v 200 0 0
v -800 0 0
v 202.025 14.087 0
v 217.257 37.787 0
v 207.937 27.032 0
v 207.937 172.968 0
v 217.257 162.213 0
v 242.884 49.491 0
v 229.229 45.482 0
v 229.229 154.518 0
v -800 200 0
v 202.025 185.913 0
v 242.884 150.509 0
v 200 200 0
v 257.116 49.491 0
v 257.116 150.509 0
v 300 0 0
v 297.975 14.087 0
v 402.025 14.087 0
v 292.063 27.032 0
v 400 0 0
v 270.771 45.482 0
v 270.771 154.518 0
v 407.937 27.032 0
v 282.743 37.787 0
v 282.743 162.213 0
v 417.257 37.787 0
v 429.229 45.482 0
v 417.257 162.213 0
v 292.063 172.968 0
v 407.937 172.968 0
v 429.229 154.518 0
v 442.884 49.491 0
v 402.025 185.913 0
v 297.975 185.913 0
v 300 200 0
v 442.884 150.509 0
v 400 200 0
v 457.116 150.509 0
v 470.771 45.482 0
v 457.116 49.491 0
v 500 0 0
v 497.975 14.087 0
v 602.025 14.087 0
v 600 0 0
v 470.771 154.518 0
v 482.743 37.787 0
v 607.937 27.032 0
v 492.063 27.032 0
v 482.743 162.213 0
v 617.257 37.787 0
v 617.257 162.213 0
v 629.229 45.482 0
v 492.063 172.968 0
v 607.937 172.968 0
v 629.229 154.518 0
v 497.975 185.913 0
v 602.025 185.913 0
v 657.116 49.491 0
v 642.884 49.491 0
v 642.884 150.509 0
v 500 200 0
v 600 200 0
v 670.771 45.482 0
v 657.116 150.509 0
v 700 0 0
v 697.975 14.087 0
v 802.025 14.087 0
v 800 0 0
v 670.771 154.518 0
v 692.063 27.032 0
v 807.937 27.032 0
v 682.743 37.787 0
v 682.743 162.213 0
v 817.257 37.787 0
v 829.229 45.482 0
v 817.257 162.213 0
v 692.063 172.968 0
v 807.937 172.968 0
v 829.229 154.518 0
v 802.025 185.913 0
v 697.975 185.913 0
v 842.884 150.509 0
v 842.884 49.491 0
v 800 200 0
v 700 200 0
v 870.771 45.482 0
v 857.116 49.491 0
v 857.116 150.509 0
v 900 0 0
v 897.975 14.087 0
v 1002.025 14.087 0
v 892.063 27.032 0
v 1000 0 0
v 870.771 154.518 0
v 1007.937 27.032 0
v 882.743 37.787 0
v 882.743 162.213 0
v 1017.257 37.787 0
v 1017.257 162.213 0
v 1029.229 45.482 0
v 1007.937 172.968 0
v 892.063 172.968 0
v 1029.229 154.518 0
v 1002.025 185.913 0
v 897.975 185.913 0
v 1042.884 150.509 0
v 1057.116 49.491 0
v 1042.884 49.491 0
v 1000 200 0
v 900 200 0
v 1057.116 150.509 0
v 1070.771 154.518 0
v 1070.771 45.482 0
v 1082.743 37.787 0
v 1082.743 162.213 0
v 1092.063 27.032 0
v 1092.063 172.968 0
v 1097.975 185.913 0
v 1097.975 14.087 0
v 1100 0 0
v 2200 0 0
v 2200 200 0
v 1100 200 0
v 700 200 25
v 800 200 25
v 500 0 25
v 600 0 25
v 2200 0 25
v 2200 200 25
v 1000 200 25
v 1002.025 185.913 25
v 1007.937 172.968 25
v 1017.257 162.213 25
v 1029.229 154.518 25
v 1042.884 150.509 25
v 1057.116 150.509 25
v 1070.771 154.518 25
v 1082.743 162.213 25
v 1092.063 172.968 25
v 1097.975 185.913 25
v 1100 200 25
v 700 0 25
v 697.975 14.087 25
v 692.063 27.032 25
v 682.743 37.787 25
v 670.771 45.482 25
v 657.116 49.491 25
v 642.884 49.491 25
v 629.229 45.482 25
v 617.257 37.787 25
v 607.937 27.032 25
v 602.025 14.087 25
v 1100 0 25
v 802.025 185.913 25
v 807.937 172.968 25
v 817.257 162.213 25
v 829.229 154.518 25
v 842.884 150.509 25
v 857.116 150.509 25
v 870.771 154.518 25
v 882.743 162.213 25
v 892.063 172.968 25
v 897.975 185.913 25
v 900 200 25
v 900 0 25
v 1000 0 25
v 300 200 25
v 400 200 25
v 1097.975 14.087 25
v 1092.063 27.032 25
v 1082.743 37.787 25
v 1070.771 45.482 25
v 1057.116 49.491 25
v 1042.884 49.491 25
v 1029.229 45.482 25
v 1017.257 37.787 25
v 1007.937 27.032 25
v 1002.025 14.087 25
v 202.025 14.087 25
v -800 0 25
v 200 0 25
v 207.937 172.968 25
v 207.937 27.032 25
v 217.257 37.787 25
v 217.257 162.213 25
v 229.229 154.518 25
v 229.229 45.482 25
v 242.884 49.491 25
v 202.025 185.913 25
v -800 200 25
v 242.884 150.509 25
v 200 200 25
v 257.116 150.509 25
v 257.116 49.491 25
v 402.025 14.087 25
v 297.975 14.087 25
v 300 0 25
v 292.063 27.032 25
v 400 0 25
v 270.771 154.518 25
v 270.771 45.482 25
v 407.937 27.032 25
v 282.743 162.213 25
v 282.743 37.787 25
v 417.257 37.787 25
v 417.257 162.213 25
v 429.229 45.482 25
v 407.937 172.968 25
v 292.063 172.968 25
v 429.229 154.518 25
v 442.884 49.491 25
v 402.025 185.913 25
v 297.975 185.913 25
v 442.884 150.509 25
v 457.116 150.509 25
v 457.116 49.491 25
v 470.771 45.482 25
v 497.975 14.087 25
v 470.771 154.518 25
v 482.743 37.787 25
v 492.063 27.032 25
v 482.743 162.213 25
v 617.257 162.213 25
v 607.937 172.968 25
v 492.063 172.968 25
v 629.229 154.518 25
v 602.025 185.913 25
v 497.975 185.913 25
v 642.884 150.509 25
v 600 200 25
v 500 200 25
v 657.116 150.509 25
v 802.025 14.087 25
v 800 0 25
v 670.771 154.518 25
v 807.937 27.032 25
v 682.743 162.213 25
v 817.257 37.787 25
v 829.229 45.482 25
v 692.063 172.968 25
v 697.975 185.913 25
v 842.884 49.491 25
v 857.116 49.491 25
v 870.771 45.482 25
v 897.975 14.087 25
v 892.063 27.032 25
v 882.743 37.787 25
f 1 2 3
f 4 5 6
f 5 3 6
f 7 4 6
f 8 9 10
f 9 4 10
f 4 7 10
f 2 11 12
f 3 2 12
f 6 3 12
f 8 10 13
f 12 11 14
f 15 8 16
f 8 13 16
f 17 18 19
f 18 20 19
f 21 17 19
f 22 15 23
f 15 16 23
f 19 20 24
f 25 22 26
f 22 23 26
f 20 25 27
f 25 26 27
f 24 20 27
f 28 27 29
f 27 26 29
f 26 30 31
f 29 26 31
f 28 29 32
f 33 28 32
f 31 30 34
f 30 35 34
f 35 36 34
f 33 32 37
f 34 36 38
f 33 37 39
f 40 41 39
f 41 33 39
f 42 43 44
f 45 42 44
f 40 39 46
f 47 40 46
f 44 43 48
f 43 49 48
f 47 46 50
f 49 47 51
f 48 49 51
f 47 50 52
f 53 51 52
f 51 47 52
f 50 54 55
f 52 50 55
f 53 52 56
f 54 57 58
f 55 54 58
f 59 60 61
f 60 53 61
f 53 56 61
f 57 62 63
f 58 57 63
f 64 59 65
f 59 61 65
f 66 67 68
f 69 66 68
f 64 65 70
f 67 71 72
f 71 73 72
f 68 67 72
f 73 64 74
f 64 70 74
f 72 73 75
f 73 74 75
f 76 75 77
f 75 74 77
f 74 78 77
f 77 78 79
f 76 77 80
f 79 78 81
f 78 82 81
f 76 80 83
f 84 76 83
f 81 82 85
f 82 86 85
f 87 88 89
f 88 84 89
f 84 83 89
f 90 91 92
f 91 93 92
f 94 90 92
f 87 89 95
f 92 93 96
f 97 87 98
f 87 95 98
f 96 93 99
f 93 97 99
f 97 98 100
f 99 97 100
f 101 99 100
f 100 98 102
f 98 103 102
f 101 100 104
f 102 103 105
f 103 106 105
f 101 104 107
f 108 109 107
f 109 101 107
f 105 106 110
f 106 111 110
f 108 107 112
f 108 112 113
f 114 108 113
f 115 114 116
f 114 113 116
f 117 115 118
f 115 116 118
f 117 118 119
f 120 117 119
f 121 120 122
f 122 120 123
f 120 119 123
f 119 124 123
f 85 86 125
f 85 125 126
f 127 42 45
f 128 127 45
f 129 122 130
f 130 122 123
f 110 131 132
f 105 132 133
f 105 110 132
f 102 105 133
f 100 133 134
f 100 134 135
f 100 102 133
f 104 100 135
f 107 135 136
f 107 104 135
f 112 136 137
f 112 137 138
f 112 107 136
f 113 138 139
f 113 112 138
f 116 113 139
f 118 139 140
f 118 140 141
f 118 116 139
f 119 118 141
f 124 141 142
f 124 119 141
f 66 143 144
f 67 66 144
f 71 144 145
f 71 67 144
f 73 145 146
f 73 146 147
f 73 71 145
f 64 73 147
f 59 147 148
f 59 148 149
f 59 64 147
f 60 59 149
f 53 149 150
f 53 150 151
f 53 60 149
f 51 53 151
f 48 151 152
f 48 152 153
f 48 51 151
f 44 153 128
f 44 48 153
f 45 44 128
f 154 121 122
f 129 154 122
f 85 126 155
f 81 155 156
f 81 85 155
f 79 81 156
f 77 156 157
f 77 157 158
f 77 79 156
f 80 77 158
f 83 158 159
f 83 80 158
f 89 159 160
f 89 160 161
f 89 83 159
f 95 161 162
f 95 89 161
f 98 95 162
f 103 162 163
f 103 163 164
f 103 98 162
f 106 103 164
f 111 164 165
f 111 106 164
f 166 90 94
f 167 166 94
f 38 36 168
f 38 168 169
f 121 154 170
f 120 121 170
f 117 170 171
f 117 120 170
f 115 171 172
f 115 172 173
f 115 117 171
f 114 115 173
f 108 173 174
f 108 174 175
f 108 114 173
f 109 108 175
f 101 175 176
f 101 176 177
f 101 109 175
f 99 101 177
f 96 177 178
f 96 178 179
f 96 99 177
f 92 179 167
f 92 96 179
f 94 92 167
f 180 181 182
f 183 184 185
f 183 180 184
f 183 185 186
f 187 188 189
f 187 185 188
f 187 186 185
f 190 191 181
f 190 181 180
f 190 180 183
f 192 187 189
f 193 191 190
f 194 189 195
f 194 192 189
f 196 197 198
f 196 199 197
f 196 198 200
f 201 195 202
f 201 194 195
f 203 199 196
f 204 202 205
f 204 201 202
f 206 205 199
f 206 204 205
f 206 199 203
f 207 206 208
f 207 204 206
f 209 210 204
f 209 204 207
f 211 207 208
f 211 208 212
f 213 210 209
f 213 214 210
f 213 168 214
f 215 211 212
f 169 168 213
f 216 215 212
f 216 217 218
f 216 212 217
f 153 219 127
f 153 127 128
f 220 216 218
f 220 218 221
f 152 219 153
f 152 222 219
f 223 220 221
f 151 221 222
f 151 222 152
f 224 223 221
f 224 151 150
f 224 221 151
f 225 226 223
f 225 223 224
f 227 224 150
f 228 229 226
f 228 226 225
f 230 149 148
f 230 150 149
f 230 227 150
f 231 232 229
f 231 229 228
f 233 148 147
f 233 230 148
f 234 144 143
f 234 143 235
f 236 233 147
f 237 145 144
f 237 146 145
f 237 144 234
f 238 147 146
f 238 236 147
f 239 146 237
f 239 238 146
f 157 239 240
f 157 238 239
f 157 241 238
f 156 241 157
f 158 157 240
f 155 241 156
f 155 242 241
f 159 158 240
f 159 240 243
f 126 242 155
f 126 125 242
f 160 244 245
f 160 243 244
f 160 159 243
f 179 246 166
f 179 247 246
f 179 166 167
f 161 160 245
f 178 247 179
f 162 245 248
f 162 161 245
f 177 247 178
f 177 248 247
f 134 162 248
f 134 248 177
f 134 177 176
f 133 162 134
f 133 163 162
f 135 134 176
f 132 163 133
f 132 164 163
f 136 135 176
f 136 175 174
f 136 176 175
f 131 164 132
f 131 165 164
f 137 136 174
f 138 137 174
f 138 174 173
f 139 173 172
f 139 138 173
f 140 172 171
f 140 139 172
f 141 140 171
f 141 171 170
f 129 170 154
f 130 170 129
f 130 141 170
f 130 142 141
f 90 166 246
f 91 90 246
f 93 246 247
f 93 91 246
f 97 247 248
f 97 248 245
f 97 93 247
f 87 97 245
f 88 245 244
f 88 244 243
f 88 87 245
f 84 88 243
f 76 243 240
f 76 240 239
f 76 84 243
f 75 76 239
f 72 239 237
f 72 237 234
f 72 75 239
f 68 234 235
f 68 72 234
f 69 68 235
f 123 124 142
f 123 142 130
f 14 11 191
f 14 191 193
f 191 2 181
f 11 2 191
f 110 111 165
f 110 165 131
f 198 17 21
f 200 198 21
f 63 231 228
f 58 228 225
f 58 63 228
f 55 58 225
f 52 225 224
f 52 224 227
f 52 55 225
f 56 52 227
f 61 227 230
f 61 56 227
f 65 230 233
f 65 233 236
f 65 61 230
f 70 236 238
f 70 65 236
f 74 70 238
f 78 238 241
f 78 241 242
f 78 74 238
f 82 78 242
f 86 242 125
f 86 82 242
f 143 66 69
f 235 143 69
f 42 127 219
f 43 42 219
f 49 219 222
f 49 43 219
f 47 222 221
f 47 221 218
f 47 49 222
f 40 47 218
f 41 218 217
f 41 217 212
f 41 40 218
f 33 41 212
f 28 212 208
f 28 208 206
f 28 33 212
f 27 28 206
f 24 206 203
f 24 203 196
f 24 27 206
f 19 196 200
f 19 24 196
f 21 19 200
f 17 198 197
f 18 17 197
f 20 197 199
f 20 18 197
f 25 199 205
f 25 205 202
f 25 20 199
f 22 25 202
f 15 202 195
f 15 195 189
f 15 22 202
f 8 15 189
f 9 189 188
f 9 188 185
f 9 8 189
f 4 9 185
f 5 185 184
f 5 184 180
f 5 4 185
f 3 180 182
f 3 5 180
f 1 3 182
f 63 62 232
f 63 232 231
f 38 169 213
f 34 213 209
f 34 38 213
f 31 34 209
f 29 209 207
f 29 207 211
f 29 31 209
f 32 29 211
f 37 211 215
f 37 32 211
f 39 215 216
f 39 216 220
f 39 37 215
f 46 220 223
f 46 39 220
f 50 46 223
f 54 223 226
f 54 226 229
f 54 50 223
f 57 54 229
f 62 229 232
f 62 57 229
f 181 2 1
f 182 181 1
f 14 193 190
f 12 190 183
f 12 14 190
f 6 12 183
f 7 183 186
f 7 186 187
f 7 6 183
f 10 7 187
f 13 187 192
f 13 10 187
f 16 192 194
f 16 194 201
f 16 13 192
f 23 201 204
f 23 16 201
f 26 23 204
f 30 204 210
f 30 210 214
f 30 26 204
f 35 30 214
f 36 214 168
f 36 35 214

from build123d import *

# Parameters (mm, degrees)
CYLINDER_R        = 50
CYLINDER_DEPTH    = 25
CYLINDER002_R     = 50
CYLINDER002_DEPTH = 25
CYLINDER001_R     = 50
CYLINDER001_DEPTH = 25
CYLINDER003_R     = 50
CYLINDER003_DEPTH = 25
CYLINDER004_R     = 50
CYLINDER004_DEPTH = 25
CYLINDER006_R     = 50
CYLINDER006_DEPTH = 25
CYLINDER005_R     = 50
CYLINDER005_DEPTH = 25
CYLINDER007_R     = 50
CYLINDER007_DEPTH = 25
CYLINDER008_R     = 50
CYLINDER008_DEPTH = 25
CYLINDER009_R     = 50
CYLINDER009_DEPTH = 25
BOX_W             = 3000
BOX_H             = 200
BOX_DEPTH         = 25


with BuildPart() as cylinder:
    # Cylinder → Cylinder (new body)
    with BuildSketch(Plane(origin=(250, 0, 0), x_dir=(1, 0, 0), z_dir=(0, 0, 1))):
        Circle(CYLINDER_R)
    extrude(amount=CYLINDER_DEPTH)


with BuildPart() as cylinder002:
    # Cylinder002 → Cylinder002 (new body)
    with BuildSketch(Plane(origin=(650, 0, 0), x_dir=(1, 0, 0), z_dir=(0, 0, 1))):
        Circle(CYLINDER002_R)
    extrude(amount=CYLINDER002_DEPTH)


with BuildPart() as cylinder001:
    # Cylinder001 → Cylinder001 (new body)
    with BuildSketch(Plane(origin=(450, 0, 0), x_dir=(1, 0, 0), z_dir=(0, 0, 1))):
        Circle(CYLINDER001_R)
    extrude(amount=CYLINDER001_DEPTH)


with BuildPart() as cylinder003:
    # Cylinder003 → Cylinder003 (new body)
    with BuildSketch(Plane(origin=(850, 0, 0), x_dir=(1, 0, 0), z_dir=(0, 0, 1))):
        Circle(CYLINDER003_R)
    extrude(amount=CYLINDER003_DEPTH)


with BuildPart() as cylinder004:
    # Cylinder004 → Cylinder004 (new body)
    with BuildSketch(Plane(origin=(1050, 0, 0), x_dir=(1, 0, 0), z_dir=(0, 0, 1))):
        Circle(CYLINDER004_R)
    extrude(amount=CYLINDER004_DEPTH)


with BuildPart() as cylinder006:
    # Cylinder006 → Cylinder006 (new body)
    with BuildSketch(Plane(origin=(450, 200, 0), x_dir=(1, 0, 0), z_dir=(0, 0, 1))):
        Circle(CYLINDER006_R)
    extrude(amount=CYLINDER006_DEPTH)


with BuildPart() as cylinder005:
    # Cylinder005 → Cylinder005 (new body)
    with BuildSketch(Plane(origin=(250, 200, 0), x_dir=(1, 0, 0), z_dir=(0, 0, 1))):
        Circle(CYLINDER005_R)
    extrude(amount=CYLINDER005_DEPTH)


with BuildPart() as cylinder007:
    # Cylinder007 → Cylinder007 (new body)
    with BuildSketch(Plane(origin=(650, 200, 0), x_dir=(1, 0, 0), z_dir=(0, 0, 1))):
        Circle(CYLINDER007_R)
    extrude(amount=CYLINDER007_DEPTH)


with BuildPart() as cylinder008:
    # Cylinder008 → Cylinder008 (new body)
    with BuildSketch(Plane(origin=(850, 200, 0), x_dir=(1, 0, 0), z_dir=(0, 0, 1))):
        Circle(CYLINDER008_R)
    extrude(amount=CYLINDER008_DEPTH)


with BuildPart() as fusion:
    # Cylinder009 → Cylinder009 (new body)
    with BuildSketch(Plane(origin=(1050, 200, 0), x_dir=(1, 0, 0), z_dir=(0, 0, 1))):
        Circle(CYLINDER009_R)
    extrude(amount=CYLINDER009_DEPTH)

    # Fusion: union Cylinder, Cylinder002, Cylinder001, Cylinder003, Cylinder004, Cylinder006, Cylinder005, Cylinder007, Cylinder008
    add(cylinder.part)
    add(cylinder002.part)
    add(cylinder001.part)
    add(cylinder003.part)
    add(cylinder004.part)
    add(cylinder006.part)
    add(cylinder005.part)
    add(cylinder007.part)
    add(cylinder008.part)


with BuildPart() as cut:
    # Box → Box (new body)
    with BuildSketch(Plane(origin=(-800, 0, 0), x_dir=(1, 0, 0), z_dir=(0, 0, 1))):
        with Locations((1500, 100)):
            Rectangle(BOX_W, BOX_H)
    extrude(amount=BOX_DEPTH)

    # Cut: cut Fusion
    add(fusion.part, mode=Mode.SUBTRACT)


solid = cut.part
